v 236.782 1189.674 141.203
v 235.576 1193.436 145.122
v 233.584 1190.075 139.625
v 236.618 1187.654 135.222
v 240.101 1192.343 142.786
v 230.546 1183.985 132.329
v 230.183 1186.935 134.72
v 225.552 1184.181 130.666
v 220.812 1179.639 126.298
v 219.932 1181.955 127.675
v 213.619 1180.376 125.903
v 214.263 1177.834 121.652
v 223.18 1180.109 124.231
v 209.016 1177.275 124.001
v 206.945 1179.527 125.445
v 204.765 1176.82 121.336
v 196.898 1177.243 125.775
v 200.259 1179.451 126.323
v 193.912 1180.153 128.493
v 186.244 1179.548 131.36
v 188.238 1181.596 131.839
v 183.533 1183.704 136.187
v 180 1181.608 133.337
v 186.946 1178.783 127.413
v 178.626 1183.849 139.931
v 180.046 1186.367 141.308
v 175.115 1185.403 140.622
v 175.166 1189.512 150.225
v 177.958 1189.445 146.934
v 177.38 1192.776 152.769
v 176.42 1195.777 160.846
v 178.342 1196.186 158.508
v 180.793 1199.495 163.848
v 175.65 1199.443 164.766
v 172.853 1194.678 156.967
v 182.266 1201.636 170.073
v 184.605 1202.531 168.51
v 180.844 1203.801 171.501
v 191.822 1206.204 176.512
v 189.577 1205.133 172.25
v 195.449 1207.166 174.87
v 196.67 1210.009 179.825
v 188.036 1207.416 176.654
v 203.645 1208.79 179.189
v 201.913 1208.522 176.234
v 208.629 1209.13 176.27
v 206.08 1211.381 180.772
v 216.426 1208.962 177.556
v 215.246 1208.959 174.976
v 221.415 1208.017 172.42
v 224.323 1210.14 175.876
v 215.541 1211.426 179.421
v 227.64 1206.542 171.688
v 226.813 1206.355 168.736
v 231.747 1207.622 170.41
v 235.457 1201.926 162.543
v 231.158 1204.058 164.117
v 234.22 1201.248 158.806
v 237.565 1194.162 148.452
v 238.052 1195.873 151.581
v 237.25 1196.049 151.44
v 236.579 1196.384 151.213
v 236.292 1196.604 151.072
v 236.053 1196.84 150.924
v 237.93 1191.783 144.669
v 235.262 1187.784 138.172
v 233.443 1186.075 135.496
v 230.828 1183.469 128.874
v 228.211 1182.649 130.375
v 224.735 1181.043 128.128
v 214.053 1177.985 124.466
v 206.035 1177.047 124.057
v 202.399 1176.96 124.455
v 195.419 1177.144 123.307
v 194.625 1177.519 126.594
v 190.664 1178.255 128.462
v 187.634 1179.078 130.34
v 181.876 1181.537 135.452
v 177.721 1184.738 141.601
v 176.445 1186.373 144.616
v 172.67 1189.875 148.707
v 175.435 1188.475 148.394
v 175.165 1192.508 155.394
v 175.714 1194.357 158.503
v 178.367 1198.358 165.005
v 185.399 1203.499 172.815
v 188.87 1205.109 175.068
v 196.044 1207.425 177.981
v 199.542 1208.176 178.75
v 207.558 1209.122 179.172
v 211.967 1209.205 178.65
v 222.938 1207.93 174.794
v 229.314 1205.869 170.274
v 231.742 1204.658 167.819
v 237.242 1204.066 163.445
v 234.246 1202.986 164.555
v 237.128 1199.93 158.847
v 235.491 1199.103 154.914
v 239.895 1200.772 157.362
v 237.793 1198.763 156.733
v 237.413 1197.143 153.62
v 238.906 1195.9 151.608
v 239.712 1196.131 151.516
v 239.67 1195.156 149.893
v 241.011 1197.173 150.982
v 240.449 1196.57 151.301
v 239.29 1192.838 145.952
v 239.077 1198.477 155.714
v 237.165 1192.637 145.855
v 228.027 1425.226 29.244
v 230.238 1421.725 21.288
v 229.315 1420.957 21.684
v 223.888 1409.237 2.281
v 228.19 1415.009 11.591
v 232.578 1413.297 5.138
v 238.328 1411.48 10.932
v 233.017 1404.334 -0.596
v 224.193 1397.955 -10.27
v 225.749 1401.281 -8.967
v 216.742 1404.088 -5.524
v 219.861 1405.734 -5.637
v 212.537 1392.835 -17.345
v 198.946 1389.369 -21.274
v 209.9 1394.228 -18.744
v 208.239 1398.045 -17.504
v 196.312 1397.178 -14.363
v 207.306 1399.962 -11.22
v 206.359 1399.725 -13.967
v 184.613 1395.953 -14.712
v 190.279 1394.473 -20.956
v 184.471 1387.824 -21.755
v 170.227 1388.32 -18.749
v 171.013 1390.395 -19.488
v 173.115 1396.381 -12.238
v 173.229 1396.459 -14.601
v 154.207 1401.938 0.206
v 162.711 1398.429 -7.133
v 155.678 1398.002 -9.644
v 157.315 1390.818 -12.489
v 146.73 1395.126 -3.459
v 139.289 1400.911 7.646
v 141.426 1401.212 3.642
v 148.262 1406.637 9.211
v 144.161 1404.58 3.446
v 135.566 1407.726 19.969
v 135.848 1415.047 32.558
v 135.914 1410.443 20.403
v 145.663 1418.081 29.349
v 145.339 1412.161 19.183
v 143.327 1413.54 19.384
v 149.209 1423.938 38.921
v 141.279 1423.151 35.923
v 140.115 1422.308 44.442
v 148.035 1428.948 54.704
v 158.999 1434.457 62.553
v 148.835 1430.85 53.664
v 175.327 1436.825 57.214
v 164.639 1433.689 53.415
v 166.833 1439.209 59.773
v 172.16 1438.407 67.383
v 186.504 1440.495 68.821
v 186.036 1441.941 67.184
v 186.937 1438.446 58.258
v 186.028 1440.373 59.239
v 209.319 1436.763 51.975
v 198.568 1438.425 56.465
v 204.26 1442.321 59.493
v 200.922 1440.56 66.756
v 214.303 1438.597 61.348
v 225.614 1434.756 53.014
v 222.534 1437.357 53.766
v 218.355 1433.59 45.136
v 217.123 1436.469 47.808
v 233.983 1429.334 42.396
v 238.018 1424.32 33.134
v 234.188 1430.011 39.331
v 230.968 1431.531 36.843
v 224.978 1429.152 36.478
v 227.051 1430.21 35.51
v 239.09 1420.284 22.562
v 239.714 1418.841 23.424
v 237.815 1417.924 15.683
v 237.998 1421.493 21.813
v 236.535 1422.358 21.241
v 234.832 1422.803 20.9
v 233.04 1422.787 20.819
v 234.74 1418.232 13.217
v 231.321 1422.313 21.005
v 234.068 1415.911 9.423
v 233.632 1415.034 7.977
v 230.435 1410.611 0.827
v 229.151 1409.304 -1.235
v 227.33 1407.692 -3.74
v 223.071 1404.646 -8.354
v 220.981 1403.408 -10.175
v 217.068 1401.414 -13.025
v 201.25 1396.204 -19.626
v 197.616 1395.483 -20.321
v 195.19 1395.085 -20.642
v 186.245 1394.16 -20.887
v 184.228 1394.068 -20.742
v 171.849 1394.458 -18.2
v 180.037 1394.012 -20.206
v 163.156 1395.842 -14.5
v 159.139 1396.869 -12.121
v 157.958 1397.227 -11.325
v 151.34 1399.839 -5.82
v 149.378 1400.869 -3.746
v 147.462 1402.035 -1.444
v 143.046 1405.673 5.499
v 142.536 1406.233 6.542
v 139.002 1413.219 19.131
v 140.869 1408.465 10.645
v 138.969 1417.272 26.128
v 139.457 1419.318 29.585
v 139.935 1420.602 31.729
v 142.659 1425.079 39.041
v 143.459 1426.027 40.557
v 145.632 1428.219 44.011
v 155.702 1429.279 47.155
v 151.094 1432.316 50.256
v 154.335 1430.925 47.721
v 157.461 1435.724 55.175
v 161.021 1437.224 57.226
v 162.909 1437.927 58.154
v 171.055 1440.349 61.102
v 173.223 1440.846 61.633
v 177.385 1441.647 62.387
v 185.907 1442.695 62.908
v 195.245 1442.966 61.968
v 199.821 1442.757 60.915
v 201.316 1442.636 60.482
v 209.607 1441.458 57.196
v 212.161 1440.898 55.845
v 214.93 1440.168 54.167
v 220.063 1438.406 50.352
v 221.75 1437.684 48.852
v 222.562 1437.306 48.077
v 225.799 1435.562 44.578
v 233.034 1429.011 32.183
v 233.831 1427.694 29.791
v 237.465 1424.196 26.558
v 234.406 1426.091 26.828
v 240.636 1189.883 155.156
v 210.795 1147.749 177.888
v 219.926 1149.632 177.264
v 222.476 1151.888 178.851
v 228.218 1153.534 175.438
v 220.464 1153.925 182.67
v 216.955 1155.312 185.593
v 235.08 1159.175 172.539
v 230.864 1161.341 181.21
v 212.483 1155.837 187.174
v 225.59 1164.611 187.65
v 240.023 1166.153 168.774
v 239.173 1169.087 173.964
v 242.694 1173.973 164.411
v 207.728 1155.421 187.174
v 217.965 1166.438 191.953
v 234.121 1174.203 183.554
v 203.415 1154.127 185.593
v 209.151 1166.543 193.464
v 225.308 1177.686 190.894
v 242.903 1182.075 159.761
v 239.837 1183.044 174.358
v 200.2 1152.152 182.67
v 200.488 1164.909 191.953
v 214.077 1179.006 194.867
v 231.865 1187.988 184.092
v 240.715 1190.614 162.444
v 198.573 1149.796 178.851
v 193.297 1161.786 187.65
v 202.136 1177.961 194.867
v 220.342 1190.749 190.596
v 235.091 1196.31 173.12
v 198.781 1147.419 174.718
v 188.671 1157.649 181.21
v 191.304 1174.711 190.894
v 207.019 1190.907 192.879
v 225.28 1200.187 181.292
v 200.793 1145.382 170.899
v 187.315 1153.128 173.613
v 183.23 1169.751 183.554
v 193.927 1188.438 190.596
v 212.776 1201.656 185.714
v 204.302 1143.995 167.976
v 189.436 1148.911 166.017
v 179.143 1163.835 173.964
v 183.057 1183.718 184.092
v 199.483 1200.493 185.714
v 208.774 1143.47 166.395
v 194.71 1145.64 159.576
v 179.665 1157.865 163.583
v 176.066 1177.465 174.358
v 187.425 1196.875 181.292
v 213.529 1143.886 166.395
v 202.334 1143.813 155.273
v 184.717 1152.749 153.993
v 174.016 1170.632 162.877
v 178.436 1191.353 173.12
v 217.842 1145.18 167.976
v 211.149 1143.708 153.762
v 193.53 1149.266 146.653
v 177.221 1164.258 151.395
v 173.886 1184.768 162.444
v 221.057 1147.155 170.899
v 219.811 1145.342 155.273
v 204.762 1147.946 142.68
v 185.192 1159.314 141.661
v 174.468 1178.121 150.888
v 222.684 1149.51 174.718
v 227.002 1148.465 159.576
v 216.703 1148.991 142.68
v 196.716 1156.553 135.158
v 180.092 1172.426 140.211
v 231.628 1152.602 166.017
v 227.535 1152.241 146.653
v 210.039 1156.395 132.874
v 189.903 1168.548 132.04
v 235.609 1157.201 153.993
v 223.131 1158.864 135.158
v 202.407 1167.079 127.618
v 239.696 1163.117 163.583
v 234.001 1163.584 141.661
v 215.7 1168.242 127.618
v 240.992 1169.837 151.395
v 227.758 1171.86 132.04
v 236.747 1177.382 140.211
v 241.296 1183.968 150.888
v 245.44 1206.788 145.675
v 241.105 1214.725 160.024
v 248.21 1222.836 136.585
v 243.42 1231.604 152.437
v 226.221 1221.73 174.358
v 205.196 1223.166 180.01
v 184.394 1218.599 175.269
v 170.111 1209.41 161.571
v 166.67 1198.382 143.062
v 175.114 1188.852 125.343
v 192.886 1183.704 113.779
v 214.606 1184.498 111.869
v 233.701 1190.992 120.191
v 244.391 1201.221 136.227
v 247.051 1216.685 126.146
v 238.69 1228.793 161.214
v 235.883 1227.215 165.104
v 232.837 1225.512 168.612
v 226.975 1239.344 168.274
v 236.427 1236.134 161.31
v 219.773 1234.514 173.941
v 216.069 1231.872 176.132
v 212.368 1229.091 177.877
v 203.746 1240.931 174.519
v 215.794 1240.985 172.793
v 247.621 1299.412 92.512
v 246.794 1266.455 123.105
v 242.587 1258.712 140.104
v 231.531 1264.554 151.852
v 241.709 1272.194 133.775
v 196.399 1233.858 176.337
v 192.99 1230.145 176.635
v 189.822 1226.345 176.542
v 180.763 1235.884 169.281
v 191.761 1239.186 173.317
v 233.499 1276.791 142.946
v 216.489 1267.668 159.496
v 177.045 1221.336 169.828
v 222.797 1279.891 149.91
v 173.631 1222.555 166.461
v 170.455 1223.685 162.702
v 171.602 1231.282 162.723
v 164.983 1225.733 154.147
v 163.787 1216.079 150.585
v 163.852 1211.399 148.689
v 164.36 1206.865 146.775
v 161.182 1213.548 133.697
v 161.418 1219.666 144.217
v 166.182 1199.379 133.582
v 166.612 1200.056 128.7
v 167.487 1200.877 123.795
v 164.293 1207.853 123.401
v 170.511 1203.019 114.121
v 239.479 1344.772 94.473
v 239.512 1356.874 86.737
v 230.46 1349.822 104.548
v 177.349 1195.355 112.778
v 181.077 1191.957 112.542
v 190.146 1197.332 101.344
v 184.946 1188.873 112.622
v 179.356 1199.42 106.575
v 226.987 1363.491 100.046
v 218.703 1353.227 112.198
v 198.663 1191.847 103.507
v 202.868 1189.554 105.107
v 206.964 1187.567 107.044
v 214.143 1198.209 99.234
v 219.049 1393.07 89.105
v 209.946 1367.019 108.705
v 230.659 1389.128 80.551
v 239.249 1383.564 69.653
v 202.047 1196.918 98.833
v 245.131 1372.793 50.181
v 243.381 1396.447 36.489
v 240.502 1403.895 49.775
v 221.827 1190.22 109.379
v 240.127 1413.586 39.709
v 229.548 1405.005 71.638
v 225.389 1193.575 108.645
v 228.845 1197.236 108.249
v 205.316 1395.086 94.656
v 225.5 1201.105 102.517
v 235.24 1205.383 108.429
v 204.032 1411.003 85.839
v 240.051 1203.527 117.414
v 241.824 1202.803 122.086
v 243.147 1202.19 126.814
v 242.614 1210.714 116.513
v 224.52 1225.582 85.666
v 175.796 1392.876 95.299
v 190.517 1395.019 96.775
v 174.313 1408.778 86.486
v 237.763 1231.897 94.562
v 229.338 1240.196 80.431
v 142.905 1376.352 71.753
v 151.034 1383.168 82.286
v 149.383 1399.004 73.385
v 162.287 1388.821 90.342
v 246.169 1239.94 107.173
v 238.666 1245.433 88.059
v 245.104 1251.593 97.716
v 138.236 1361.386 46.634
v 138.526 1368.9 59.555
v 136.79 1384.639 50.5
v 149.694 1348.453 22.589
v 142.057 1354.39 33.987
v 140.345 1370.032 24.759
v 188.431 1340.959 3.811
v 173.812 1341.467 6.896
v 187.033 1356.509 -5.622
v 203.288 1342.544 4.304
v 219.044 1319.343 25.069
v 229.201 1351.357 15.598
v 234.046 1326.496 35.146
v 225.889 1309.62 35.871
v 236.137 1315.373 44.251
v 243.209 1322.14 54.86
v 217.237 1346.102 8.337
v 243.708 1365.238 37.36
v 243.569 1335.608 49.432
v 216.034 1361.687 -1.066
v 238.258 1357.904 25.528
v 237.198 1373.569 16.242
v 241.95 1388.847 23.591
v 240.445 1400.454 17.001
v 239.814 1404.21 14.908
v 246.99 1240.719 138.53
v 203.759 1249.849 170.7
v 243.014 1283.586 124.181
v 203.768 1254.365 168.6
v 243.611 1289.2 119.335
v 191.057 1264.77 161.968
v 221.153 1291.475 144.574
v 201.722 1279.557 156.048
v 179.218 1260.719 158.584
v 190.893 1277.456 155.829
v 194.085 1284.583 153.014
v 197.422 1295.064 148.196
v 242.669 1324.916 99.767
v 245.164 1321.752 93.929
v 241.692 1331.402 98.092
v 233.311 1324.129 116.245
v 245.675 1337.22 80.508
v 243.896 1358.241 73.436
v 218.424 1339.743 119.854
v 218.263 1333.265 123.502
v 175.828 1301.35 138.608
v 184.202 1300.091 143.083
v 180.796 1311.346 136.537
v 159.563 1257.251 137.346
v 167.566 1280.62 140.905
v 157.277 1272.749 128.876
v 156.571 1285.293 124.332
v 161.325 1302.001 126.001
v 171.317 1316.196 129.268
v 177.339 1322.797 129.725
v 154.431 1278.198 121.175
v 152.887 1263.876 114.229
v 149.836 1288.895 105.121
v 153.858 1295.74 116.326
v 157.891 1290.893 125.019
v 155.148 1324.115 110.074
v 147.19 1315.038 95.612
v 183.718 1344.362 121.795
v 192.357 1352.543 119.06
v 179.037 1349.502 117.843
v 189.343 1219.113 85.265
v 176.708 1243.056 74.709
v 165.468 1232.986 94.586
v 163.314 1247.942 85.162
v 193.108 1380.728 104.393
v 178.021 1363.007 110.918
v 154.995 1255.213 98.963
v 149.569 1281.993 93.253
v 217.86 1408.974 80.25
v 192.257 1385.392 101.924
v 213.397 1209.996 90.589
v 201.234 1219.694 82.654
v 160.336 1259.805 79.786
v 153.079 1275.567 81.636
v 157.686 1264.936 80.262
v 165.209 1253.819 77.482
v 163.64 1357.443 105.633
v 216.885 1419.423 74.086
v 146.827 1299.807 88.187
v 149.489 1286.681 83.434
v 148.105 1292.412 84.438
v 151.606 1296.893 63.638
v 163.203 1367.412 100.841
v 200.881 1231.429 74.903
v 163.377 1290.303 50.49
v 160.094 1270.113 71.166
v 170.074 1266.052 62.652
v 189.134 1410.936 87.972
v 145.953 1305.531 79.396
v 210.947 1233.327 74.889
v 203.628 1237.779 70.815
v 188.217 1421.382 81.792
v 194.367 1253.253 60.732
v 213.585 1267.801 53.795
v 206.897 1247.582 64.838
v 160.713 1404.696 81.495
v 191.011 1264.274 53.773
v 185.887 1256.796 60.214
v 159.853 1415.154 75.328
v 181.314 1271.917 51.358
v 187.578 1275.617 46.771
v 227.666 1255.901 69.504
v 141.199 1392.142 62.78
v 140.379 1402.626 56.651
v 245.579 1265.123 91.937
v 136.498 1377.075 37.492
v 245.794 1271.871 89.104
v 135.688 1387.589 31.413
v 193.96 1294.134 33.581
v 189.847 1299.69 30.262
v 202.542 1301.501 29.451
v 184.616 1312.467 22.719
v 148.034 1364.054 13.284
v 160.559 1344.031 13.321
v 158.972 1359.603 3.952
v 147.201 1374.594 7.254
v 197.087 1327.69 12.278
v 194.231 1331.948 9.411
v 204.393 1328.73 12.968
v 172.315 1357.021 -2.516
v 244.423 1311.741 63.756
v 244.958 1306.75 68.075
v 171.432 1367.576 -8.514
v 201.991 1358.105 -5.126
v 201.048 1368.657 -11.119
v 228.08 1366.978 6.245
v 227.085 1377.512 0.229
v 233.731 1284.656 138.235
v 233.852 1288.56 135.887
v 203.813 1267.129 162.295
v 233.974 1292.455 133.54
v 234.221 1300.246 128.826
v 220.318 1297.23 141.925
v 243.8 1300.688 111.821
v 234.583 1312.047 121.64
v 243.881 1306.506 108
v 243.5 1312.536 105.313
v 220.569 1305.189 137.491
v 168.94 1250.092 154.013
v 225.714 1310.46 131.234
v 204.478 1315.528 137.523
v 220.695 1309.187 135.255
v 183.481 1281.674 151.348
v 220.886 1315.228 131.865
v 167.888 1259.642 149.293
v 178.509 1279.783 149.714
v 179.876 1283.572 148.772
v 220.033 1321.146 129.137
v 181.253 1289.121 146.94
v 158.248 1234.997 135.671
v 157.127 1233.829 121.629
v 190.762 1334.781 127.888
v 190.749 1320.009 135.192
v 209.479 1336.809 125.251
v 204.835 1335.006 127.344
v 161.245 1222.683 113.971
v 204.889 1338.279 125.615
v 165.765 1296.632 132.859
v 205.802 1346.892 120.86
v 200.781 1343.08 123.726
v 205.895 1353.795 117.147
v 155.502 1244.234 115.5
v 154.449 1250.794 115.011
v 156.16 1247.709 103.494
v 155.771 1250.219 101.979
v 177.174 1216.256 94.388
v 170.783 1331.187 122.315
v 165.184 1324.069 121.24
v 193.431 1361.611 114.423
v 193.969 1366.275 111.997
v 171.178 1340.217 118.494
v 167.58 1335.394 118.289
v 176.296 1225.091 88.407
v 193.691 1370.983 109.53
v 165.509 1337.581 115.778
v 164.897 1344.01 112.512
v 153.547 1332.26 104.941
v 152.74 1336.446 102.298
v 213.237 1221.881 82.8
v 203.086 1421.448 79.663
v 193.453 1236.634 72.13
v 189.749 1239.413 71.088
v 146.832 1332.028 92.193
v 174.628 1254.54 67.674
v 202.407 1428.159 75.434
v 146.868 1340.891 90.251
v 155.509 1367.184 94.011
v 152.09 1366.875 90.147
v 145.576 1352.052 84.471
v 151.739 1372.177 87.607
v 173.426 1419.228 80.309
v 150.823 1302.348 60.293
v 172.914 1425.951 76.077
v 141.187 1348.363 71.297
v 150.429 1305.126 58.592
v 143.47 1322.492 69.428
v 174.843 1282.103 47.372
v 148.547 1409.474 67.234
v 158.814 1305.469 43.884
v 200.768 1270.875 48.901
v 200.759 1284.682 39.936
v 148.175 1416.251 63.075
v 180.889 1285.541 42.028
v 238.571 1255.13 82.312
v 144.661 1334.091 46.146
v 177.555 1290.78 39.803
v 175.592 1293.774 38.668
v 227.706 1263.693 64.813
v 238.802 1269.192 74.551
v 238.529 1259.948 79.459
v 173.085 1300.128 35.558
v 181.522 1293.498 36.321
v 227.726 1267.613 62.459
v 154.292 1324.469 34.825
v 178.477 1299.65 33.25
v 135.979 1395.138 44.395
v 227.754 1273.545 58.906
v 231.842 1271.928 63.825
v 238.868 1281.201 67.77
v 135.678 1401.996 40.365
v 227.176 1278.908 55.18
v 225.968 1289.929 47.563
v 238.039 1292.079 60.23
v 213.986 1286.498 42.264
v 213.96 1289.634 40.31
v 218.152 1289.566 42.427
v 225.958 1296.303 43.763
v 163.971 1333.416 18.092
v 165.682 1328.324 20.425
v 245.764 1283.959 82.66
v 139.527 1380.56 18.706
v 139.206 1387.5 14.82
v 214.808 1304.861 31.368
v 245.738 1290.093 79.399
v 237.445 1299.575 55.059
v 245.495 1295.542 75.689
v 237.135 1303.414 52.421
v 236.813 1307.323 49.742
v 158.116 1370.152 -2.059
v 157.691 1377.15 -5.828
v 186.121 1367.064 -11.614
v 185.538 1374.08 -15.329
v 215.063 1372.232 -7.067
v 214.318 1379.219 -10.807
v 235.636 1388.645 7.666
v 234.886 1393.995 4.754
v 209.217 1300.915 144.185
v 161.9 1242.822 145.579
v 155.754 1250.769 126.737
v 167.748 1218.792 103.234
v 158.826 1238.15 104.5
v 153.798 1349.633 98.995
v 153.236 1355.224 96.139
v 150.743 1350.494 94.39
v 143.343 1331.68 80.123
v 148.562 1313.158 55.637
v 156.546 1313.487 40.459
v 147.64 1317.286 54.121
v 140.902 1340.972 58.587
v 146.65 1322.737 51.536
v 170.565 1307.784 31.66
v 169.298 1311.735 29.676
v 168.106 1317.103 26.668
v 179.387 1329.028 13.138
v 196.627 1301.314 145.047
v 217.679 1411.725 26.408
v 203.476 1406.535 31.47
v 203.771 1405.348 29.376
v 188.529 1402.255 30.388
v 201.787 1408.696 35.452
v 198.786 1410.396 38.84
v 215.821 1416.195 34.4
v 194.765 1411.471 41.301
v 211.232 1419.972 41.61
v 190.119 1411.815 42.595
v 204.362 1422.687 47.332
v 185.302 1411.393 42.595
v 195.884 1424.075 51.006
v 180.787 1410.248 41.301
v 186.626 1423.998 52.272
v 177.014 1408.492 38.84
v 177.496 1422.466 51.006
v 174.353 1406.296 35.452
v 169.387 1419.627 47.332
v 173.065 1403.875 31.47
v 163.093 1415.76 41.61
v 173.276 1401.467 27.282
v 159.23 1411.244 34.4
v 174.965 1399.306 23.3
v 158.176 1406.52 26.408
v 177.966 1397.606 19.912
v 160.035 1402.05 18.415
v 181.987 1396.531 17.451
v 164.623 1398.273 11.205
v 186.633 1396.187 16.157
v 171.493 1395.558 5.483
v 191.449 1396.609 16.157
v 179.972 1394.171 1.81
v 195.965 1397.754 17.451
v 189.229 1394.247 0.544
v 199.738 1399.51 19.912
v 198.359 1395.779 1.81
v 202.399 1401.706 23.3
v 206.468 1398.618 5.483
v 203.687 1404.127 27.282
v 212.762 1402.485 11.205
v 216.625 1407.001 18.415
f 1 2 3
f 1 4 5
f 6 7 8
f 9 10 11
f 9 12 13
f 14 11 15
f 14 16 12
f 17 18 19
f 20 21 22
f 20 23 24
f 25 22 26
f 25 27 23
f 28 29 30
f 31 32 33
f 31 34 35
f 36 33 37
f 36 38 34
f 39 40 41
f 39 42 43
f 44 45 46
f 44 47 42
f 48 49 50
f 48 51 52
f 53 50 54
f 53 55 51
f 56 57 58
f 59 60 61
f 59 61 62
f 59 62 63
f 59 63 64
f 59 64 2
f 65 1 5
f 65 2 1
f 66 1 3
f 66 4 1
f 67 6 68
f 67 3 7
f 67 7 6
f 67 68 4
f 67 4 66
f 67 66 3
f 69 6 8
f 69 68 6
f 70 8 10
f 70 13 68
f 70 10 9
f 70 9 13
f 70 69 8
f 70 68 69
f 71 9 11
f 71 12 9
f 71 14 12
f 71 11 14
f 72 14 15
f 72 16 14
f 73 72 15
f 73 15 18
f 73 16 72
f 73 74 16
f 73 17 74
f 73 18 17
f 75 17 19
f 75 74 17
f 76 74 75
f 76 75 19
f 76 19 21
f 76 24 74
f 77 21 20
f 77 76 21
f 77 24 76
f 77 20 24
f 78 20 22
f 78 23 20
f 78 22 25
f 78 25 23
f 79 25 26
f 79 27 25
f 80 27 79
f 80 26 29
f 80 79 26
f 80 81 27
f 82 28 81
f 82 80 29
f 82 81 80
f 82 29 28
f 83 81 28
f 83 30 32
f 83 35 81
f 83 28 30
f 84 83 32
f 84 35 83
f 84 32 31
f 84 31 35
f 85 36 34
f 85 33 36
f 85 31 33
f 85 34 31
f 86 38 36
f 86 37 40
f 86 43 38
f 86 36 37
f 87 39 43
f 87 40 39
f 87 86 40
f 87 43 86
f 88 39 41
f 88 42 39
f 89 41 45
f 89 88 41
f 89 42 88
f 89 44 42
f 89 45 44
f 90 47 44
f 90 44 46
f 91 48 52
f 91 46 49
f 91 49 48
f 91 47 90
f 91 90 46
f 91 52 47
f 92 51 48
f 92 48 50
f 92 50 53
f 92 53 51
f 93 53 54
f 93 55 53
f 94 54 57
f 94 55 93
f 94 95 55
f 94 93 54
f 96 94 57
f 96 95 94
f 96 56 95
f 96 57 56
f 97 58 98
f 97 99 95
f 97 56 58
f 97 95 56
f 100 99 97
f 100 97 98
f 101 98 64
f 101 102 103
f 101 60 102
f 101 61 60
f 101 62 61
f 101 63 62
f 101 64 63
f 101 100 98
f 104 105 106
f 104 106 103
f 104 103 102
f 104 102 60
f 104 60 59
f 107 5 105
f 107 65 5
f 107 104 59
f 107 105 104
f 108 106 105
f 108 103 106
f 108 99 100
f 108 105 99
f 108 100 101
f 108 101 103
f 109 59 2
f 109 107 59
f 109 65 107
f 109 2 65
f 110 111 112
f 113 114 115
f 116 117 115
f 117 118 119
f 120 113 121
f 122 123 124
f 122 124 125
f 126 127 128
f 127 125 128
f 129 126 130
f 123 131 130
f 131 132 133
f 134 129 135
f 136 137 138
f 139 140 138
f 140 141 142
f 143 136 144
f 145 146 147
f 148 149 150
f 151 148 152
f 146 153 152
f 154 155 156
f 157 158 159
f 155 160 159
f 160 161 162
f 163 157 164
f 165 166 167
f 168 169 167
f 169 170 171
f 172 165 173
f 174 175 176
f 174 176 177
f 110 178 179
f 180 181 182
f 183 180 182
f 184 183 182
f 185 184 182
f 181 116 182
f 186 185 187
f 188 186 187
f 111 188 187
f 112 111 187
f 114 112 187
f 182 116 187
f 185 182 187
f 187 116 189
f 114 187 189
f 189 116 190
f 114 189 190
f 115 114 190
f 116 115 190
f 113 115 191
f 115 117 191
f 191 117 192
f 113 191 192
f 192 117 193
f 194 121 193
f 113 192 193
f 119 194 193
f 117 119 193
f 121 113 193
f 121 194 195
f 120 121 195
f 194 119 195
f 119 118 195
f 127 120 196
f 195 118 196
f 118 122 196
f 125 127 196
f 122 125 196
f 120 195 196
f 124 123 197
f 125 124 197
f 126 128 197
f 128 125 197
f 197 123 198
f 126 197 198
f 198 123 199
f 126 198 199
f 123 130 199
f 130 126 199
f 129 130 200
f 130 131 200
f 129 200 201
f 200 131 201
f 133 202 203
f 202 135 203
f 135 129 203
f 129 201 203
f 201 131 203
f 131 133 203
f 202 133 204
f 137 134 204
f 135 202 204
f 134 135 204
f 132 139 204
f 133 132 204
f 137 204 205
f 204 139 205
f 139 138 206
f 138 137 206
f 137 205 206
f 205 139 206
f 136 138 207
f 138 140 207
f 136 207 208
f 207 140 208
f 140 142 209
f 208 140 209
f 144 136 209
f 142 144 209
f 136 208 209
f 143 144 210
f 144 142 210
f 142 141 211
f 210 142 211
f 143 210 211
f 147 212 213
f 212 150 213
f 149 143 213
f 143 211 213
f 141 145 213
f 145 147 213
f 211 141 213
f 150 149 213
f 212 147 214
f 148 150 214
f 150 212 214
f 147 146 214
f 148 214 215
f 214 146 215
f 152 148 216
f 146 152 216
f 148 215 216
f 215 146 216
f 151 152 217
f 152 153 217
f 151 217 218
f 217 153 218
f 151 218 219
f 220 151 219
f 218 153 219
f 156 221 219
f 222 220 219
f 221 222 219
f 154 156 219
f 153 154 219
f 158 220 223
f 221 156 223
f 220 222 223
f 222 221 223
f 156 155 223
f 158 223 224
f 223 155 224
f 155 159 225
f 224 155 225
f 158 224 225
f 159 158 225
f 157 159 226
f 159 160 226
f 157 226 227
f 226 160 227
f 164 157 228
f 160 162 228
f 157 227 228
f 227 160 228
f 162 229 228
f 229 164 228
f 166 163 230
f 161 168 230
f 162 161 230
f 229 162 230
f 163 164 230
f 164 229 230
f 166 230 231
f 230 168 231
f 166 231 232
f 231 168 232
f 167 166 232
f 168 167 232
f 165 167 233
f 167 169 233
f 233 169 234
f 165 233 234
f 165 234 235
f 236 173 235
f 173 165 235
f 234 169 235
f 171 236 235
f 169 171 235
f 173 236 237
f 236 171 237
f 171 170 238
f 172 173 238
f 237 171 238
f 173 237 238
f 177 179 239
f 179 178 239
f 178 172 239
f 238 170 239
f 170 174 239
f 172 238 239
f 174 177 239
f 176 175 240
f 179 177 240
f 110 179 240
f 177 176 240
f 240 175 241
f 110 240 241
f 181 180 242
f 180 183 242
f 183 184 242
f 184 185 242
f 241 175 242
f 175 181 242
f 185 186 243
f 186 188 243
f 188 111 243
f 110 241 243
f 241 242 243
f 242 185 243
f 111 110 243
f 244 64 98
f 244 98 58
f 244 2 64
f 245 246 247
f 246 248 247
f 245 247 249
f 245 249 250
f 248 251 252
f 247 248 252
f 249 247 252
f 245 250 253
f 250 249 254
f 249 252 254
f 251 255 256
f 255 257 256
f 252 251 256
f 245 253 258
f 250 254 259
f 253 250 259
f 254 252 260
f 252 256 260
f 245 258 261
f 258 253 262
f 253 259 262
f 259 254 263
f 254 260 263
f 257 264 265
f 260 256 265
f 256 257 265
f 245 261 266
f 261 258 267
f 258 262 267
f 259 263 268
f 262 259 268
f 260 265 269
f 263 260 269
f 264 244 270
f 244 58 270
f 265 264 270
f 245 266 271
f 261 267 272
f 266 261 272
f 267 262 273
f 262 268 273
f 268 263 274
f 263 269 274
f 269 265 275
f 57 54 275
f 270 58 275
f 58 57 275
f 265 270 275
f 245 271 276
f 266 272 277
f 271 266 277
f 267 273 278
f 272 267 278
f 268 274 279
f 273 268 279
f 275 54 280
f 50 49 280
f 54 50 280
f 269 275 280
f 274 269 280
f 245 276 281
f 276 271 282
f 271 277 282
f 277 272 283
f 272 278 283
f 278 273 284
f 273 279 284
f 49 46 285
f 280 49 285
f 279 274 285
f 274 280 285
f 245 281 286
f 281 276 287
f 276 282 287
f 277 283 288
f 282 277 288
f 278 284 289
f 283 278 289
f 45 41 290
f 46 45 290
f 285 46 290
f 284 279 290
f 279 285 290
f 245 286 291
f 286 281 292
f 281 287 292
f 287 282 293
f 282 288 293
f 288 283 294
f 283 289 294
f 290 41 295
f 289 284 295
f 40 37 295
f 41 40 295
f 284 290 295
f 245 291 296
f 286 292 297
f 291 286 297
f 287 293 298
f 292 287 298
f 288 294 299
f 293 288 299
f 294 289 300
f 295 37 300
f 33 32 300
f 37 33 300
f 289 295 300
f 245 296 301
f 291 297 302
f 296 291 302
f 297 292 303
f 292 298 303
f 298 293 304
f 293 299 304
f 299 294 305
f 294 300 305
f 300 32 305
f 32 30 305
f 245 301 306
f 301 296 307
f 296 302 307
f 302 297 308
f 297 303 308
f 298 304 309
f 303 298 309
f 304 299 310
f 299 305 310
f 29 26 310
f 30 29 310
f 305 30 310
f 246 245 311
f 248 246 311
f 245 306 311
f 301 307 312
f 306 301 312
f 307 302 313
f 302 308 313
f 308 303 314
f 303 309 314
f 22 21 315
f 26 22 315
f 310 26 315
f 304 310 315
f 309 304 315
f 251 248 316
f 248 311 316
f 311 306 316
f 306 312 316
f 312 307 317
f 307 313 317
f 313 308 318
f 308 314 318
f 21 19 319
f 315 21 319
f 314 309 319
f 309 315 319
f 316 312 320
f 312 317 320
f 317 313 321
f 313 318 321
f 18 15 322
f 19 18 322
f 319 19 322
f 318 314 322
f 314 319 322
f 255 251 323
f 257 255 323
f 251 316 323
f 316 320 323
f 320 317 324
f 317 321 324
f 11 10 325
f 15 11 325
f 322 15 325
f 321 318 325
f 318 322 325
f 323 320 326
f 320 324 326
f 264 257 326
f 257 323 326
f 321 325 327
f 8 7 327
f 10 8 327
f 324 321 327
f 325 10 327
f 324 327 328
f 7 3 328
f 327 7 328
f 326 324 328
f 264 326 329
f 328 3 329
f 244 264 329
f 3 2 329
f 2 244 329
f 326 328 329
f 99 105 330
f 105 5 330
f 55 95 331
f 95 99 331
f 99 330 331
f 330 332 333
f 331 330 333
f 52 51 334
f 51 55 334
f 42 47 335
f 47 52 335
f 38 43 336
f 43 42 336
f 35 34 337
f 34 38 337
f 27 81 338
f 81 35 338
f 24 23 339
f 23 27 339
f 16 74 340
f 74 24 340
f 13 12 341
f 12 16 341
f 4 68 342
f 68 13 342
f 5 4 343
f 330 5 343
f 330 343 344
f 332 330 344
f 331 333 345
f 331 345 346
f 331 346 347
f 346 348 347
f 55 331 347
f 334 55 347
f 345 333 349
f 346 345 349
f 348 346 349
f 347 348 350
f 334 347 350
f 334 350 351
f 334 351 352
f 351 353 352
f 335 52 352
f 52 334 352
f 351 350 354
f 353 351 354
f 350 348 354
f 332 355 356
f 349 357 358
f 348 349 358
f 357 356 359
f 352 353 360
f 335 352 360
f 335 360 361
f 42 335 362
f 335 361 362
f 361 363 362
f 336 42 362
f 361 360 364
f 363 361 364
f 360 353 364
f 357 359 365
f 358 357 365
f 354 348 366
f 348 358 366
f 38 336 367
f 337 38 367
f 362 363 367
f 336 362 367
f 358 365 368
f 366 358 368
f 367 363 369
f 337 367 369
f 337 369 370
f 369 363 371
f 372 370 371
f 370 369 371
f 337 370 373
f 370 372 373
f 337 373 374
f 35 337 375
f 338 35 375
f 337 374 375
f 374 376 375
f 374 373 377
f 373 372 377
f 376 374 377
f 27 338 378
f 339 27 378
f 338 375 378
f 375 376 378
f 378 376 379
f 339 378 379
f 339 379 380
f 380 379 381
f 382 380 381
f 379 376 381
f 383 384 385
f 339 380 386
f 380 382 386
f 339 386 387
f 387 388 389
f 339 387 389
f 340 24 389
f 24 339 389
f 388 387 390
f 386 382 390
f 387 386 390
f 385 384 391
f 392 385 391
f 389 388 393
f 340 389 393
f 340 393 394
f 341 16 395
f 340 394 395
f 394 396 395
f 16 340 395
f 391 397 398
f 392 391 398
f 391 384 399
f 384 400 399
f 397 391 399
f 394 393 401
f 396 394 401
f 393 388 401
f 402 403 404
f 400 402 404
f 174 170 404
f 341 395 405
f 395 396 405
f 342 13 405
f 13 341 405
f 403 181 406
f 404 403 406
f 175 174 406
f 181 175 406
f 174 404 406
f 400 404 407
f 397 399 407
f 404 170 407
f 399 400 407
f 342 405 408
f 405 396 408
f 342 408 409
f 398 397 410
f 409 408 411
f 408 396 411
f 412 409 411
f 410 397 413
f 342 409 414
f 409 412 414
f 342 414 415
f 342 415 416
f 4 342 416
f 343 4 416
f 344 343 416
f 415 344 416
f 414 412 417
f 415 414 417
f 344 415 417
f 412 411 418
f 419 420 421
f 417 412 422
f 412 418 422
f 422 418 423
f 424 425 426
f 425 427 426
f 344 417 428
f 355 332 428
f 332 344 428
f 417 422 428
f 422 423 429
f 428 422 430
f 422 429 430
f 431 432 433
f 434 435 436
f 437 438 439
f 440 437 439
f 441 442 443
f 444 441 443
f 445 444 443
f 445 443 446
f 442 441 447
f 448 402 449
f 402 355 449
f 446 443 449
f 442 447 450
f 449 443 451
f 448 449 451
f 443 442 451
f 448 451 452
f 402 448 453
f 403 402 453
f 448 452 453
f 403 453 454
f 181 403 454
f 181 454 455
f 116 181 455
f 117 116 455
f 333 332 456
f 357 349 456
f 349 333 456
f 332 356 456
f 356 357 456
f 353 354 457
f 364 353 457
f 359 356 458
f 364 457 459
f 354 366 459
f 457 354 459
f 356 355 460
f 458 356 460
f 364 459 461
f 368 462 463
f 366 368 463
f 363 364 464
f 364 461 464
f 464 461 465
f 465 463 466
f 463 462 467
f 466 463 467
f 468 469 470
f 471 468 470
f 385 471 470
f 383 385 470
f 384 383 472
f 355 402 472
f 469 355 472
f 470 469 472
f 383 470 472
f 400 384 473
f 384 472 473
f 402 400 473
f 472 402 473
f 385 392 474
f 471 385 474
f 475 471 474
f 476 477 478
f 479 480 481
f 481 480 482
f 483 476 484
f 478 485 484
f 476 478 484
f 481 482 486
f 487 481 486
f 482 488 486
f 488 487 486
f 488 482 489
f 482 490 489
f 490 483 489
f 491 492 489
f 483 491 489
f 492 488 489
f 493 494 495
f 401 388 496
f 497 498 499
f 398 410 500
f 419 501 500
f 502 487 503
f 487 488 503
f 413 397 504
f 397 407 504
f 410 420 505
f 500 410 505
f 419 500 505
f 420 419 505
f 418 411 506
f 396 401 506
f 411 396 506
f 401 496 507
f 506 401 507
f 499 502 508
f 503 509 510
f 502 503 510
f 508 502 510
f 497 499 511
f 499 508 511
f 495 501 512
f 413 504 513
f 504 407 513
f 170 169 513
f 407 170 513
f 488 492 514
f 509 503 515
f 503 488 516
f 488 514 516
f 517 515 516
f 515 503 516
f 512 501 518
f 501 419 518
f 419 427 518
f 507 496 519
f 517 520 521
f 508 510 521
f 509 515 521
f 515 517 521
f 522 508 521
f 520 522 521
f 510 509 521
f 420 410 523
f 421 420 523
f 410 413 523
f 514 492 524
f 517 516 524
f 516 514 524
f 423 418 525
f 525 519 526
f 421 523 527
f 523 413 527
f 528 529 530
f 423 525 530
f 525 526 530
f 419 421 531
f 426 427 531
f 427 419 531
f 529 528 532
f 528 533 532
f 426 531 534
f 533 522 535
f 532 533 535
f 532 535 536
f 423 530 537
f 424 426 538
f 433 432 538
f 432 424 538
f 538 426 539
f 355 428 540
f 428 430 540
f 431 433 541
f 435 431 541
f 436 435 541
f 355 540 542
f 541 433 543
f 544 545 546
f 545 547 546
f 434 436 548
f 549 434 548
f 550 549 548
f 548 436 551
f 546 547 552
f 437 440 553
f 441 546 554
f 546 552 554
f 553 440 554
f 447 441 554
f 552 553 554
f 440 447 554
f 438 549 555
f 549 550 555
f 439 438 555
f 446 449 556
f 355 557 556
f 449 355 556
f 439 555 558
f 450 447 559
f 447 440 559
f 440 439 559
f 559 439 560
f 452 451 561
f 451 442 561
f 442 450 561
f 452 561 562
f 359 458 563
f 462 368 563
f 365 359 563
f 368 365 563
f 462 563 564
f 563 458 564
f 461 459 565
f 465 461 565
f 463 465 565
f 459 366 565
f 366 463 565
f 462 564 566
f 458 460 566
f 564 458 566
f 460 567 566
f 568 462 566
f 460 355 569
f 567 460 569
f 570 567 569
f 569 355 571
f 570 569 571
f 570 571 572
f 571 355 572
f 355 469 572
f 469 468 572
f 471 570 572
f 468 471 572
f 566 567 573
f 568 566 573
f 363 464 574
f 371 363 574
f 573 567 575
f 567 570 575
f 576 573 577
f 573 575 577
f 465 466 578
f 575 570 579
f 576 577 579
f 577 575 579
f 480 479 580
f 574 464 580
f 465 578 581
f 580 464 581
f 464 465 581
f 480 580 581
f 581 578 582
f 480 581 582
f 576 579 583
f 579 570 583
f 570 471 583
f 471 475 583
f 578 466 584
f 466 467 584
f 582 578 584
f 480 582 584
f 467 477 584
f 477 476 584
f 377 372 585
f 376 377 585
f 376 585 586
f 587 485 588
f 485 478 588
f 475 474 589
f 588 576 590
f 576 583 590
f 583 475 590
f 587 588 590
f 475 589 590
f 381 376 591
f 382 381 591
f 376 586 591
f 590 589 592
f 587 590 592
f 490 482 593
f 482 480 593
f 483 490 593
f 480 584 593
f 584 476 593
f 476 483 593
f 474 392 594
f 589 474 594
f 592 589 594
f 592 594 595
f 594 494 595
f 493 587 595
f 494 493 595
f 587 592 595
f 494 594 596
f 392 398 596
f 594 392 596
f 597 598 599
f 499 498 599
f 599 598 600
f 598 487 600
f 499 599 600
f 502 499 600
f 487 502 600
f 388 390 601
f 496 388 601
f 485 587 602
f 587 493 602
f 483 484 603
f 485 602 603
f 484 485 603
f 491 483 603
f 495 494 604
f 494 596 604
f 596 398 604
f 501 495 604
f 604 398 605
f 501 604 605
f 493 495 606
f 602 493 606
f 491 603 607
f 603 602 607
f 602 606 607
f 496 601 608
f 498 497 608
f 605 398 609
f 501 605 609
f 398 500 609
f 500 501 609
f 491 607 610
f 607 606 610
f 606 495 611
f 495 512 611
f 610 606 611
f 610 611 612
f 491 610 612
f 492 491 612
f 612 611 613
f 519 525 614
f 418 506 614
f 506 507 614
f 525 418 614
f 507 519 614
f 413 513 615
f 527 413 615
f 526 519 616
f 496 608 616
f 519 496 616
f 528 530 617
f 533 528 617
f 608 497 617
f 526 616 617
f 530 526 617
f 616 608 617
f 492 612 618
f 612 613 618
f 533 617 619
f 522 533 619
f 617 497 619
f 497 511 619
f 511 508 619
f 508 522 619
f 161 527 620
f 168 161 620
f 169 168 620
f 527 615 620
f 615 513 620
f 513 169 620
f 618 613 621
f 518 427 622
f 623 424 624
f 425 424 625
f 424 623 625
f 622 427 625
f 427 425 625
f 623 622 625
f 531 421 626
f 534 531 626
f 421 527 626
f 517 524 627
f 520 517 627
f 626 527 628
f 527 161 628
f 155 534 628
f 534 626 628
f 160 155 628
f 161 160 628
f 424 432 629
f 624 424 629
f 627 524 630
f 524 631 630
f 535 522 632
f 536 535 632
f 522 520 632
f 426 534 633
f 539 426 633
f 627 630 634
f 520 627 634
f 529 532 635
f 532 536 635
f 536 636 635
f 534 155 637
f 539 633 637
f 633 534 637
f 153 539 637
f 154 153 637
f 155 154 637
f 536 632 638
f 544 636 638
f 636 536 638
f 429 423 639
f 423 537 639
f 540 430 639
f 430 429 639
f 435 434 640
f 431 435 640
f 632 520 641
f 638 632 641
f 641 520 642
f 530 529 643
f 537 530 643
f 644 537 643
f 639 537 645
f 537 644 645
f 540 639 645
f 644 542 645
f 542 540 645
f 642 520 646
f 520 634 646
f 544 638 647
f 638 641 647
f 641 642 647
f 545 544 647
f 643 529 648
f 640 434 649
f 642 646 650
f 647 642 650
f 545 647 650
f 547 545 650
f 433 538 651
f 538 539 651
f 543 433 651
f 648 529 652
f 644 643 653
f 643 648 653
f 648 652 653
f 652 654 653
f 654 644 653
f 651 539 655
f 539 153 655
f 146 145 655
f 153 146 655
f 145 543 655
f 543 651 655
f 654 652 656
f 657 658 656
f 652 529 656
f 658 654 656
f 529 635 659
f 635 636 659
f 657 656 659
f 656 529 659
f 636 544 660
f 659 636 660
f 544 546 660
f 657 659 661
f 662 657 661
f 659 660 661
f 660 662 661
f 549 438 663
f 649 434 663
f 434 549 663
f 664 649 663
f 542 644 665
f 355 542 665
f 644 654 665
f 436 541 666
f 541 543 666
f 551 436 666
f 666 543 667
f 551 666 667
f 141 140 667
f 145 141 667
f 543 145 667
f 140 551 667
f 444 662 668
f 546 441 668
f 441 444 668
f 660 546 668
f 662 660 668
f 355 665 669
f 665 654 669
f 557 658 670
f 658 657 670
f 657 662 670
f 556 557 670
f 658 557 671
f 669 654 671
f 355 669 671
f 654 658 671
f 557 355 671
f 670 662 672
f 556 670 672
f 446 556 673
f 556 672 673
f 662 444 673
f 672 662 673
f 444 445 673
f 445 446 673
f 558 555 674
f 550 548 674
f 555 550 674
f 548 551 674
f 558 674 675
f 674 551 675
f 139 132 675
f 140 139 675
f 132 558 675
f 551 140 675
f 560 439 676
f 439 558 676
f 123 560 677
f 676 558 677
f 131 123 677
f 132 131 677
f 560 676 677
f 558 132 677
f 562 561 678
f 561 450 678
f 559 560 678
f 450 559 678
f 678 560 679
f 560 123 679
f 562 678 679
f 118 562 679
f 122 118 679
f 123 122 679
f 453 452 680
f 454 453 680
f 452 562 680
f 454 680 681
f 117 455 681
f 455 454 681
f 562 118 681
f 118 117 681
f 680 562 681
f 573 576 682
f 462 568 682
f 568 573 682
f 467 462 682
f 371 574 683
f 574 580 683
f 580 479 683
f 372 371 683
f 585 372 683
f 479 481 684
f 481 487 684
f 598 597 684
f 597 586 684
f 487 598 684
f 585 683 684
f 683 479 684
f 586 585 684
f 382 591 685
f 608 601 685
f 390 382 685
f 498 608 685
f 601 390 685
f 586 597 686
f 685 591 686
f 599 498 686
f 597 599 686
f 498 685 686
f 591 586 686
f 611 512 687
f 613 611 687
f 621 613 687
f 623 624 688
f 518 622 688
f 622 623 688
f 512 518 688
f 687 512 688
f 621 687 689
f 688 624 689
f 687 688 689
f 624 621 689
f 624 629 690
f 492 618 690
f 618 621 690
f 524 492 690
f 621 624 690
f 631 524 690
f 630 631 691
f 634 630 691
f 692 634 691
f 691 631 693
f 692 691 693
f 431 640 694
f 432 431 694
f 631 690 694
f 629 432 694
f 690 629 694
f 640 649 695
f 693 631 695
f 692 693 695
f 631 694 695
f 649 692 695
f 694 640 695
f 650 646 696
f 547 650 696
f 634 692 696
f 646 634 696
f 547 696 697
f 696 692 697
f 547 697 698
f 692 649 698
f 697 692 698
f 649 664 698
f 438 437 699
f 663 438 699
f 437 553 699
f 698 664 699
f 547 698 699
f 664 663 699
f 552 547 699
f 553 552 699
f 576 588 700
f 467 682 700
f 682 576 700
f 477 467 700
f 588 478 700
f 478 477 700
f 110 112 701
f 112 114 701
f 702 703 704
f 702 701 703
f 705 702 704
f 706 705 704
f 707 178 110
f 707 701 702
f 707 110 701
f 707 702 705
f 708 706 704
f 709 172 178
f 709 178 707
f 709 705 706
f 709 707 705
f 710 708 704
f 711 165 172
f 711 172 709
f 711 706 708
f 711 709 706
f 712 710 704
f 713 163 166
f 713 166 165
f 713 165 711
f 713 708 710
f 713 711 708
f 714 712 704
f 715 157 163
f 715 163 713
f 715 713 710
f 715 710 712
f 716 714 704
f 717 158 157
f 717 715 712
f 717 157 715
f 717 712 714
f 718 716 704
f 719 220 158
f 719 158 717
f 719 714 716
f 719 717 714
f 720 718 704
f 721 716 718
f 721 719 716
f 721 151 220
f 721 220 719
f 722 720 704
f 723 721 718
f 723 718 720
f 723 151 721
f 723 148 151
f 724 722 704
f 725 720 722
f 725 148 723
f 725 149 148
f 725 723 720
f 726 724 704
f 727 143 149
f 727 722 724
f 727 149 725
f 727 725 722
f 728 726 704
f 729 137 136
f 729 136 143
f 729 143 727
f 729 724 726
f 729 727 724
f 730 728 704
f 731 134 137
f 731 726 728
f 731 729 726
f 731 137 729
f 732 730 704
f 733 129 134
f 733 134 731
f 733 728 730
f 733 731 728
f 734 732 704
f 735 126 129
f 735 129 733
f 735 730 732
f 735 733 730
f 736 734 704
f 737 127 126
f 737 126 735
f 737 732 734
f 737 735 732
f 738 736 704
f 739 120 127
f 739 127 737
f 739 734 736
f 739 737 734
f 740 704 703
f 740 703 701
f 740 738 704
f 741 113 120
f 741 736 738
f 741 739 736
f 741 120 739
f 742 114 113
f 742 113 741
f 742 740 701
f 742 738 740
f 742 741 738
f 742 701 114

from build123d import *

# Parameters (mm, degrees)
FILLET086_R             = 6
FILLET087_R             = 3
BODY052_PITCH_ANGLE     = -30
BODY052_PLACEMENT_ANGLE = -85


with BuildPart() as part:
    # Sketch175 → Revolution090 (revolve)
    with BuildSketch(Plane.XY):
        with BuildLine():
            Line((15.9442, 0), (306.848053, 0))
            add(Edge.make_bspline(
                [(306.848053, 0), (324.317413, 42.311157), (231.745069, 46.553256), (127.654996, 54.056504), (-18.918443, 56.908137), (15.9442, 0)],
                knots=[0, 0, 0, 0, 0.333333, 0.666667, 1, 1, 1, 1], degree=3))
        make_face()
    revolve(axis=Axis((0, 0, 0), (1, 0, 0)))

    # Sketch176 → Groove084 (revolve, cut)
    with BuildSketch(Plane.XY):
        with BuildLine():
            Line((-60, 0), (60, 0))
            ThreePointArc((60, 0), (0, 60), (-60, 0))
        make_face()
    revolve(axis=Axis((0, 0, 0), (1, 0, 0)), mode=Mode.SUBTRACT)

    # Fillet086
    fillet086_edges = [part.edges().sort_by_distance(p)[0] for p in [
        (33.106232, -50.039758, 0),
    ]]
    fillet(fillet086_edges, radius=FILLET086_R)

    # Sketch177 → Groove085 (revolve, cut)
    with BuildSketch(Plane.XY):
        with BuildLine():
            Line((285, 0), (355, 0))
            ThreePointArc((355, 0), (320, 35), (285, 0))
        make_face()
    revolve(axis=Axis((0, 0, 0), (1, 0, 0)), mode=Mode.SUBTRACT)

    # Fillet087
    fillet087_edges = [part.edges().sort_by_distance(p)[0] for p in [
        (304.668851, -31.463564, 0),
    ]]
    fillet(fillet087_edges, radius=FILLET087_R)

    # Sketch177 → Revolution091 (revolve)
    with BuildSketch(Plane.XY):
        with BuildLine():
            Line((285, 0), (355, 0))
            ThreePointArc((355, 0), (320, 35), (285, 0))
        make_face()
    revolve(axis=Axis((0, 0, 0), (1, 0, 0)))


with BuildPart() as part_1:
    # Body052 pitch: moved
    add(part.part.rotate(Axis((0, 0, 0), (0, 1, 0)), BODY052_PITCH_ANGLE))


with BuildPart() as part_2:
    # Body052 placement: moved
    add(part_1.part.moved(Location((184, 1454.018312, 0.388141))).rotate(Axis((184, 1454.018312, 0.388141), (0, 0, 1)), BODY052_PLACEMENT_ANGLE))


solid = part_2.part
